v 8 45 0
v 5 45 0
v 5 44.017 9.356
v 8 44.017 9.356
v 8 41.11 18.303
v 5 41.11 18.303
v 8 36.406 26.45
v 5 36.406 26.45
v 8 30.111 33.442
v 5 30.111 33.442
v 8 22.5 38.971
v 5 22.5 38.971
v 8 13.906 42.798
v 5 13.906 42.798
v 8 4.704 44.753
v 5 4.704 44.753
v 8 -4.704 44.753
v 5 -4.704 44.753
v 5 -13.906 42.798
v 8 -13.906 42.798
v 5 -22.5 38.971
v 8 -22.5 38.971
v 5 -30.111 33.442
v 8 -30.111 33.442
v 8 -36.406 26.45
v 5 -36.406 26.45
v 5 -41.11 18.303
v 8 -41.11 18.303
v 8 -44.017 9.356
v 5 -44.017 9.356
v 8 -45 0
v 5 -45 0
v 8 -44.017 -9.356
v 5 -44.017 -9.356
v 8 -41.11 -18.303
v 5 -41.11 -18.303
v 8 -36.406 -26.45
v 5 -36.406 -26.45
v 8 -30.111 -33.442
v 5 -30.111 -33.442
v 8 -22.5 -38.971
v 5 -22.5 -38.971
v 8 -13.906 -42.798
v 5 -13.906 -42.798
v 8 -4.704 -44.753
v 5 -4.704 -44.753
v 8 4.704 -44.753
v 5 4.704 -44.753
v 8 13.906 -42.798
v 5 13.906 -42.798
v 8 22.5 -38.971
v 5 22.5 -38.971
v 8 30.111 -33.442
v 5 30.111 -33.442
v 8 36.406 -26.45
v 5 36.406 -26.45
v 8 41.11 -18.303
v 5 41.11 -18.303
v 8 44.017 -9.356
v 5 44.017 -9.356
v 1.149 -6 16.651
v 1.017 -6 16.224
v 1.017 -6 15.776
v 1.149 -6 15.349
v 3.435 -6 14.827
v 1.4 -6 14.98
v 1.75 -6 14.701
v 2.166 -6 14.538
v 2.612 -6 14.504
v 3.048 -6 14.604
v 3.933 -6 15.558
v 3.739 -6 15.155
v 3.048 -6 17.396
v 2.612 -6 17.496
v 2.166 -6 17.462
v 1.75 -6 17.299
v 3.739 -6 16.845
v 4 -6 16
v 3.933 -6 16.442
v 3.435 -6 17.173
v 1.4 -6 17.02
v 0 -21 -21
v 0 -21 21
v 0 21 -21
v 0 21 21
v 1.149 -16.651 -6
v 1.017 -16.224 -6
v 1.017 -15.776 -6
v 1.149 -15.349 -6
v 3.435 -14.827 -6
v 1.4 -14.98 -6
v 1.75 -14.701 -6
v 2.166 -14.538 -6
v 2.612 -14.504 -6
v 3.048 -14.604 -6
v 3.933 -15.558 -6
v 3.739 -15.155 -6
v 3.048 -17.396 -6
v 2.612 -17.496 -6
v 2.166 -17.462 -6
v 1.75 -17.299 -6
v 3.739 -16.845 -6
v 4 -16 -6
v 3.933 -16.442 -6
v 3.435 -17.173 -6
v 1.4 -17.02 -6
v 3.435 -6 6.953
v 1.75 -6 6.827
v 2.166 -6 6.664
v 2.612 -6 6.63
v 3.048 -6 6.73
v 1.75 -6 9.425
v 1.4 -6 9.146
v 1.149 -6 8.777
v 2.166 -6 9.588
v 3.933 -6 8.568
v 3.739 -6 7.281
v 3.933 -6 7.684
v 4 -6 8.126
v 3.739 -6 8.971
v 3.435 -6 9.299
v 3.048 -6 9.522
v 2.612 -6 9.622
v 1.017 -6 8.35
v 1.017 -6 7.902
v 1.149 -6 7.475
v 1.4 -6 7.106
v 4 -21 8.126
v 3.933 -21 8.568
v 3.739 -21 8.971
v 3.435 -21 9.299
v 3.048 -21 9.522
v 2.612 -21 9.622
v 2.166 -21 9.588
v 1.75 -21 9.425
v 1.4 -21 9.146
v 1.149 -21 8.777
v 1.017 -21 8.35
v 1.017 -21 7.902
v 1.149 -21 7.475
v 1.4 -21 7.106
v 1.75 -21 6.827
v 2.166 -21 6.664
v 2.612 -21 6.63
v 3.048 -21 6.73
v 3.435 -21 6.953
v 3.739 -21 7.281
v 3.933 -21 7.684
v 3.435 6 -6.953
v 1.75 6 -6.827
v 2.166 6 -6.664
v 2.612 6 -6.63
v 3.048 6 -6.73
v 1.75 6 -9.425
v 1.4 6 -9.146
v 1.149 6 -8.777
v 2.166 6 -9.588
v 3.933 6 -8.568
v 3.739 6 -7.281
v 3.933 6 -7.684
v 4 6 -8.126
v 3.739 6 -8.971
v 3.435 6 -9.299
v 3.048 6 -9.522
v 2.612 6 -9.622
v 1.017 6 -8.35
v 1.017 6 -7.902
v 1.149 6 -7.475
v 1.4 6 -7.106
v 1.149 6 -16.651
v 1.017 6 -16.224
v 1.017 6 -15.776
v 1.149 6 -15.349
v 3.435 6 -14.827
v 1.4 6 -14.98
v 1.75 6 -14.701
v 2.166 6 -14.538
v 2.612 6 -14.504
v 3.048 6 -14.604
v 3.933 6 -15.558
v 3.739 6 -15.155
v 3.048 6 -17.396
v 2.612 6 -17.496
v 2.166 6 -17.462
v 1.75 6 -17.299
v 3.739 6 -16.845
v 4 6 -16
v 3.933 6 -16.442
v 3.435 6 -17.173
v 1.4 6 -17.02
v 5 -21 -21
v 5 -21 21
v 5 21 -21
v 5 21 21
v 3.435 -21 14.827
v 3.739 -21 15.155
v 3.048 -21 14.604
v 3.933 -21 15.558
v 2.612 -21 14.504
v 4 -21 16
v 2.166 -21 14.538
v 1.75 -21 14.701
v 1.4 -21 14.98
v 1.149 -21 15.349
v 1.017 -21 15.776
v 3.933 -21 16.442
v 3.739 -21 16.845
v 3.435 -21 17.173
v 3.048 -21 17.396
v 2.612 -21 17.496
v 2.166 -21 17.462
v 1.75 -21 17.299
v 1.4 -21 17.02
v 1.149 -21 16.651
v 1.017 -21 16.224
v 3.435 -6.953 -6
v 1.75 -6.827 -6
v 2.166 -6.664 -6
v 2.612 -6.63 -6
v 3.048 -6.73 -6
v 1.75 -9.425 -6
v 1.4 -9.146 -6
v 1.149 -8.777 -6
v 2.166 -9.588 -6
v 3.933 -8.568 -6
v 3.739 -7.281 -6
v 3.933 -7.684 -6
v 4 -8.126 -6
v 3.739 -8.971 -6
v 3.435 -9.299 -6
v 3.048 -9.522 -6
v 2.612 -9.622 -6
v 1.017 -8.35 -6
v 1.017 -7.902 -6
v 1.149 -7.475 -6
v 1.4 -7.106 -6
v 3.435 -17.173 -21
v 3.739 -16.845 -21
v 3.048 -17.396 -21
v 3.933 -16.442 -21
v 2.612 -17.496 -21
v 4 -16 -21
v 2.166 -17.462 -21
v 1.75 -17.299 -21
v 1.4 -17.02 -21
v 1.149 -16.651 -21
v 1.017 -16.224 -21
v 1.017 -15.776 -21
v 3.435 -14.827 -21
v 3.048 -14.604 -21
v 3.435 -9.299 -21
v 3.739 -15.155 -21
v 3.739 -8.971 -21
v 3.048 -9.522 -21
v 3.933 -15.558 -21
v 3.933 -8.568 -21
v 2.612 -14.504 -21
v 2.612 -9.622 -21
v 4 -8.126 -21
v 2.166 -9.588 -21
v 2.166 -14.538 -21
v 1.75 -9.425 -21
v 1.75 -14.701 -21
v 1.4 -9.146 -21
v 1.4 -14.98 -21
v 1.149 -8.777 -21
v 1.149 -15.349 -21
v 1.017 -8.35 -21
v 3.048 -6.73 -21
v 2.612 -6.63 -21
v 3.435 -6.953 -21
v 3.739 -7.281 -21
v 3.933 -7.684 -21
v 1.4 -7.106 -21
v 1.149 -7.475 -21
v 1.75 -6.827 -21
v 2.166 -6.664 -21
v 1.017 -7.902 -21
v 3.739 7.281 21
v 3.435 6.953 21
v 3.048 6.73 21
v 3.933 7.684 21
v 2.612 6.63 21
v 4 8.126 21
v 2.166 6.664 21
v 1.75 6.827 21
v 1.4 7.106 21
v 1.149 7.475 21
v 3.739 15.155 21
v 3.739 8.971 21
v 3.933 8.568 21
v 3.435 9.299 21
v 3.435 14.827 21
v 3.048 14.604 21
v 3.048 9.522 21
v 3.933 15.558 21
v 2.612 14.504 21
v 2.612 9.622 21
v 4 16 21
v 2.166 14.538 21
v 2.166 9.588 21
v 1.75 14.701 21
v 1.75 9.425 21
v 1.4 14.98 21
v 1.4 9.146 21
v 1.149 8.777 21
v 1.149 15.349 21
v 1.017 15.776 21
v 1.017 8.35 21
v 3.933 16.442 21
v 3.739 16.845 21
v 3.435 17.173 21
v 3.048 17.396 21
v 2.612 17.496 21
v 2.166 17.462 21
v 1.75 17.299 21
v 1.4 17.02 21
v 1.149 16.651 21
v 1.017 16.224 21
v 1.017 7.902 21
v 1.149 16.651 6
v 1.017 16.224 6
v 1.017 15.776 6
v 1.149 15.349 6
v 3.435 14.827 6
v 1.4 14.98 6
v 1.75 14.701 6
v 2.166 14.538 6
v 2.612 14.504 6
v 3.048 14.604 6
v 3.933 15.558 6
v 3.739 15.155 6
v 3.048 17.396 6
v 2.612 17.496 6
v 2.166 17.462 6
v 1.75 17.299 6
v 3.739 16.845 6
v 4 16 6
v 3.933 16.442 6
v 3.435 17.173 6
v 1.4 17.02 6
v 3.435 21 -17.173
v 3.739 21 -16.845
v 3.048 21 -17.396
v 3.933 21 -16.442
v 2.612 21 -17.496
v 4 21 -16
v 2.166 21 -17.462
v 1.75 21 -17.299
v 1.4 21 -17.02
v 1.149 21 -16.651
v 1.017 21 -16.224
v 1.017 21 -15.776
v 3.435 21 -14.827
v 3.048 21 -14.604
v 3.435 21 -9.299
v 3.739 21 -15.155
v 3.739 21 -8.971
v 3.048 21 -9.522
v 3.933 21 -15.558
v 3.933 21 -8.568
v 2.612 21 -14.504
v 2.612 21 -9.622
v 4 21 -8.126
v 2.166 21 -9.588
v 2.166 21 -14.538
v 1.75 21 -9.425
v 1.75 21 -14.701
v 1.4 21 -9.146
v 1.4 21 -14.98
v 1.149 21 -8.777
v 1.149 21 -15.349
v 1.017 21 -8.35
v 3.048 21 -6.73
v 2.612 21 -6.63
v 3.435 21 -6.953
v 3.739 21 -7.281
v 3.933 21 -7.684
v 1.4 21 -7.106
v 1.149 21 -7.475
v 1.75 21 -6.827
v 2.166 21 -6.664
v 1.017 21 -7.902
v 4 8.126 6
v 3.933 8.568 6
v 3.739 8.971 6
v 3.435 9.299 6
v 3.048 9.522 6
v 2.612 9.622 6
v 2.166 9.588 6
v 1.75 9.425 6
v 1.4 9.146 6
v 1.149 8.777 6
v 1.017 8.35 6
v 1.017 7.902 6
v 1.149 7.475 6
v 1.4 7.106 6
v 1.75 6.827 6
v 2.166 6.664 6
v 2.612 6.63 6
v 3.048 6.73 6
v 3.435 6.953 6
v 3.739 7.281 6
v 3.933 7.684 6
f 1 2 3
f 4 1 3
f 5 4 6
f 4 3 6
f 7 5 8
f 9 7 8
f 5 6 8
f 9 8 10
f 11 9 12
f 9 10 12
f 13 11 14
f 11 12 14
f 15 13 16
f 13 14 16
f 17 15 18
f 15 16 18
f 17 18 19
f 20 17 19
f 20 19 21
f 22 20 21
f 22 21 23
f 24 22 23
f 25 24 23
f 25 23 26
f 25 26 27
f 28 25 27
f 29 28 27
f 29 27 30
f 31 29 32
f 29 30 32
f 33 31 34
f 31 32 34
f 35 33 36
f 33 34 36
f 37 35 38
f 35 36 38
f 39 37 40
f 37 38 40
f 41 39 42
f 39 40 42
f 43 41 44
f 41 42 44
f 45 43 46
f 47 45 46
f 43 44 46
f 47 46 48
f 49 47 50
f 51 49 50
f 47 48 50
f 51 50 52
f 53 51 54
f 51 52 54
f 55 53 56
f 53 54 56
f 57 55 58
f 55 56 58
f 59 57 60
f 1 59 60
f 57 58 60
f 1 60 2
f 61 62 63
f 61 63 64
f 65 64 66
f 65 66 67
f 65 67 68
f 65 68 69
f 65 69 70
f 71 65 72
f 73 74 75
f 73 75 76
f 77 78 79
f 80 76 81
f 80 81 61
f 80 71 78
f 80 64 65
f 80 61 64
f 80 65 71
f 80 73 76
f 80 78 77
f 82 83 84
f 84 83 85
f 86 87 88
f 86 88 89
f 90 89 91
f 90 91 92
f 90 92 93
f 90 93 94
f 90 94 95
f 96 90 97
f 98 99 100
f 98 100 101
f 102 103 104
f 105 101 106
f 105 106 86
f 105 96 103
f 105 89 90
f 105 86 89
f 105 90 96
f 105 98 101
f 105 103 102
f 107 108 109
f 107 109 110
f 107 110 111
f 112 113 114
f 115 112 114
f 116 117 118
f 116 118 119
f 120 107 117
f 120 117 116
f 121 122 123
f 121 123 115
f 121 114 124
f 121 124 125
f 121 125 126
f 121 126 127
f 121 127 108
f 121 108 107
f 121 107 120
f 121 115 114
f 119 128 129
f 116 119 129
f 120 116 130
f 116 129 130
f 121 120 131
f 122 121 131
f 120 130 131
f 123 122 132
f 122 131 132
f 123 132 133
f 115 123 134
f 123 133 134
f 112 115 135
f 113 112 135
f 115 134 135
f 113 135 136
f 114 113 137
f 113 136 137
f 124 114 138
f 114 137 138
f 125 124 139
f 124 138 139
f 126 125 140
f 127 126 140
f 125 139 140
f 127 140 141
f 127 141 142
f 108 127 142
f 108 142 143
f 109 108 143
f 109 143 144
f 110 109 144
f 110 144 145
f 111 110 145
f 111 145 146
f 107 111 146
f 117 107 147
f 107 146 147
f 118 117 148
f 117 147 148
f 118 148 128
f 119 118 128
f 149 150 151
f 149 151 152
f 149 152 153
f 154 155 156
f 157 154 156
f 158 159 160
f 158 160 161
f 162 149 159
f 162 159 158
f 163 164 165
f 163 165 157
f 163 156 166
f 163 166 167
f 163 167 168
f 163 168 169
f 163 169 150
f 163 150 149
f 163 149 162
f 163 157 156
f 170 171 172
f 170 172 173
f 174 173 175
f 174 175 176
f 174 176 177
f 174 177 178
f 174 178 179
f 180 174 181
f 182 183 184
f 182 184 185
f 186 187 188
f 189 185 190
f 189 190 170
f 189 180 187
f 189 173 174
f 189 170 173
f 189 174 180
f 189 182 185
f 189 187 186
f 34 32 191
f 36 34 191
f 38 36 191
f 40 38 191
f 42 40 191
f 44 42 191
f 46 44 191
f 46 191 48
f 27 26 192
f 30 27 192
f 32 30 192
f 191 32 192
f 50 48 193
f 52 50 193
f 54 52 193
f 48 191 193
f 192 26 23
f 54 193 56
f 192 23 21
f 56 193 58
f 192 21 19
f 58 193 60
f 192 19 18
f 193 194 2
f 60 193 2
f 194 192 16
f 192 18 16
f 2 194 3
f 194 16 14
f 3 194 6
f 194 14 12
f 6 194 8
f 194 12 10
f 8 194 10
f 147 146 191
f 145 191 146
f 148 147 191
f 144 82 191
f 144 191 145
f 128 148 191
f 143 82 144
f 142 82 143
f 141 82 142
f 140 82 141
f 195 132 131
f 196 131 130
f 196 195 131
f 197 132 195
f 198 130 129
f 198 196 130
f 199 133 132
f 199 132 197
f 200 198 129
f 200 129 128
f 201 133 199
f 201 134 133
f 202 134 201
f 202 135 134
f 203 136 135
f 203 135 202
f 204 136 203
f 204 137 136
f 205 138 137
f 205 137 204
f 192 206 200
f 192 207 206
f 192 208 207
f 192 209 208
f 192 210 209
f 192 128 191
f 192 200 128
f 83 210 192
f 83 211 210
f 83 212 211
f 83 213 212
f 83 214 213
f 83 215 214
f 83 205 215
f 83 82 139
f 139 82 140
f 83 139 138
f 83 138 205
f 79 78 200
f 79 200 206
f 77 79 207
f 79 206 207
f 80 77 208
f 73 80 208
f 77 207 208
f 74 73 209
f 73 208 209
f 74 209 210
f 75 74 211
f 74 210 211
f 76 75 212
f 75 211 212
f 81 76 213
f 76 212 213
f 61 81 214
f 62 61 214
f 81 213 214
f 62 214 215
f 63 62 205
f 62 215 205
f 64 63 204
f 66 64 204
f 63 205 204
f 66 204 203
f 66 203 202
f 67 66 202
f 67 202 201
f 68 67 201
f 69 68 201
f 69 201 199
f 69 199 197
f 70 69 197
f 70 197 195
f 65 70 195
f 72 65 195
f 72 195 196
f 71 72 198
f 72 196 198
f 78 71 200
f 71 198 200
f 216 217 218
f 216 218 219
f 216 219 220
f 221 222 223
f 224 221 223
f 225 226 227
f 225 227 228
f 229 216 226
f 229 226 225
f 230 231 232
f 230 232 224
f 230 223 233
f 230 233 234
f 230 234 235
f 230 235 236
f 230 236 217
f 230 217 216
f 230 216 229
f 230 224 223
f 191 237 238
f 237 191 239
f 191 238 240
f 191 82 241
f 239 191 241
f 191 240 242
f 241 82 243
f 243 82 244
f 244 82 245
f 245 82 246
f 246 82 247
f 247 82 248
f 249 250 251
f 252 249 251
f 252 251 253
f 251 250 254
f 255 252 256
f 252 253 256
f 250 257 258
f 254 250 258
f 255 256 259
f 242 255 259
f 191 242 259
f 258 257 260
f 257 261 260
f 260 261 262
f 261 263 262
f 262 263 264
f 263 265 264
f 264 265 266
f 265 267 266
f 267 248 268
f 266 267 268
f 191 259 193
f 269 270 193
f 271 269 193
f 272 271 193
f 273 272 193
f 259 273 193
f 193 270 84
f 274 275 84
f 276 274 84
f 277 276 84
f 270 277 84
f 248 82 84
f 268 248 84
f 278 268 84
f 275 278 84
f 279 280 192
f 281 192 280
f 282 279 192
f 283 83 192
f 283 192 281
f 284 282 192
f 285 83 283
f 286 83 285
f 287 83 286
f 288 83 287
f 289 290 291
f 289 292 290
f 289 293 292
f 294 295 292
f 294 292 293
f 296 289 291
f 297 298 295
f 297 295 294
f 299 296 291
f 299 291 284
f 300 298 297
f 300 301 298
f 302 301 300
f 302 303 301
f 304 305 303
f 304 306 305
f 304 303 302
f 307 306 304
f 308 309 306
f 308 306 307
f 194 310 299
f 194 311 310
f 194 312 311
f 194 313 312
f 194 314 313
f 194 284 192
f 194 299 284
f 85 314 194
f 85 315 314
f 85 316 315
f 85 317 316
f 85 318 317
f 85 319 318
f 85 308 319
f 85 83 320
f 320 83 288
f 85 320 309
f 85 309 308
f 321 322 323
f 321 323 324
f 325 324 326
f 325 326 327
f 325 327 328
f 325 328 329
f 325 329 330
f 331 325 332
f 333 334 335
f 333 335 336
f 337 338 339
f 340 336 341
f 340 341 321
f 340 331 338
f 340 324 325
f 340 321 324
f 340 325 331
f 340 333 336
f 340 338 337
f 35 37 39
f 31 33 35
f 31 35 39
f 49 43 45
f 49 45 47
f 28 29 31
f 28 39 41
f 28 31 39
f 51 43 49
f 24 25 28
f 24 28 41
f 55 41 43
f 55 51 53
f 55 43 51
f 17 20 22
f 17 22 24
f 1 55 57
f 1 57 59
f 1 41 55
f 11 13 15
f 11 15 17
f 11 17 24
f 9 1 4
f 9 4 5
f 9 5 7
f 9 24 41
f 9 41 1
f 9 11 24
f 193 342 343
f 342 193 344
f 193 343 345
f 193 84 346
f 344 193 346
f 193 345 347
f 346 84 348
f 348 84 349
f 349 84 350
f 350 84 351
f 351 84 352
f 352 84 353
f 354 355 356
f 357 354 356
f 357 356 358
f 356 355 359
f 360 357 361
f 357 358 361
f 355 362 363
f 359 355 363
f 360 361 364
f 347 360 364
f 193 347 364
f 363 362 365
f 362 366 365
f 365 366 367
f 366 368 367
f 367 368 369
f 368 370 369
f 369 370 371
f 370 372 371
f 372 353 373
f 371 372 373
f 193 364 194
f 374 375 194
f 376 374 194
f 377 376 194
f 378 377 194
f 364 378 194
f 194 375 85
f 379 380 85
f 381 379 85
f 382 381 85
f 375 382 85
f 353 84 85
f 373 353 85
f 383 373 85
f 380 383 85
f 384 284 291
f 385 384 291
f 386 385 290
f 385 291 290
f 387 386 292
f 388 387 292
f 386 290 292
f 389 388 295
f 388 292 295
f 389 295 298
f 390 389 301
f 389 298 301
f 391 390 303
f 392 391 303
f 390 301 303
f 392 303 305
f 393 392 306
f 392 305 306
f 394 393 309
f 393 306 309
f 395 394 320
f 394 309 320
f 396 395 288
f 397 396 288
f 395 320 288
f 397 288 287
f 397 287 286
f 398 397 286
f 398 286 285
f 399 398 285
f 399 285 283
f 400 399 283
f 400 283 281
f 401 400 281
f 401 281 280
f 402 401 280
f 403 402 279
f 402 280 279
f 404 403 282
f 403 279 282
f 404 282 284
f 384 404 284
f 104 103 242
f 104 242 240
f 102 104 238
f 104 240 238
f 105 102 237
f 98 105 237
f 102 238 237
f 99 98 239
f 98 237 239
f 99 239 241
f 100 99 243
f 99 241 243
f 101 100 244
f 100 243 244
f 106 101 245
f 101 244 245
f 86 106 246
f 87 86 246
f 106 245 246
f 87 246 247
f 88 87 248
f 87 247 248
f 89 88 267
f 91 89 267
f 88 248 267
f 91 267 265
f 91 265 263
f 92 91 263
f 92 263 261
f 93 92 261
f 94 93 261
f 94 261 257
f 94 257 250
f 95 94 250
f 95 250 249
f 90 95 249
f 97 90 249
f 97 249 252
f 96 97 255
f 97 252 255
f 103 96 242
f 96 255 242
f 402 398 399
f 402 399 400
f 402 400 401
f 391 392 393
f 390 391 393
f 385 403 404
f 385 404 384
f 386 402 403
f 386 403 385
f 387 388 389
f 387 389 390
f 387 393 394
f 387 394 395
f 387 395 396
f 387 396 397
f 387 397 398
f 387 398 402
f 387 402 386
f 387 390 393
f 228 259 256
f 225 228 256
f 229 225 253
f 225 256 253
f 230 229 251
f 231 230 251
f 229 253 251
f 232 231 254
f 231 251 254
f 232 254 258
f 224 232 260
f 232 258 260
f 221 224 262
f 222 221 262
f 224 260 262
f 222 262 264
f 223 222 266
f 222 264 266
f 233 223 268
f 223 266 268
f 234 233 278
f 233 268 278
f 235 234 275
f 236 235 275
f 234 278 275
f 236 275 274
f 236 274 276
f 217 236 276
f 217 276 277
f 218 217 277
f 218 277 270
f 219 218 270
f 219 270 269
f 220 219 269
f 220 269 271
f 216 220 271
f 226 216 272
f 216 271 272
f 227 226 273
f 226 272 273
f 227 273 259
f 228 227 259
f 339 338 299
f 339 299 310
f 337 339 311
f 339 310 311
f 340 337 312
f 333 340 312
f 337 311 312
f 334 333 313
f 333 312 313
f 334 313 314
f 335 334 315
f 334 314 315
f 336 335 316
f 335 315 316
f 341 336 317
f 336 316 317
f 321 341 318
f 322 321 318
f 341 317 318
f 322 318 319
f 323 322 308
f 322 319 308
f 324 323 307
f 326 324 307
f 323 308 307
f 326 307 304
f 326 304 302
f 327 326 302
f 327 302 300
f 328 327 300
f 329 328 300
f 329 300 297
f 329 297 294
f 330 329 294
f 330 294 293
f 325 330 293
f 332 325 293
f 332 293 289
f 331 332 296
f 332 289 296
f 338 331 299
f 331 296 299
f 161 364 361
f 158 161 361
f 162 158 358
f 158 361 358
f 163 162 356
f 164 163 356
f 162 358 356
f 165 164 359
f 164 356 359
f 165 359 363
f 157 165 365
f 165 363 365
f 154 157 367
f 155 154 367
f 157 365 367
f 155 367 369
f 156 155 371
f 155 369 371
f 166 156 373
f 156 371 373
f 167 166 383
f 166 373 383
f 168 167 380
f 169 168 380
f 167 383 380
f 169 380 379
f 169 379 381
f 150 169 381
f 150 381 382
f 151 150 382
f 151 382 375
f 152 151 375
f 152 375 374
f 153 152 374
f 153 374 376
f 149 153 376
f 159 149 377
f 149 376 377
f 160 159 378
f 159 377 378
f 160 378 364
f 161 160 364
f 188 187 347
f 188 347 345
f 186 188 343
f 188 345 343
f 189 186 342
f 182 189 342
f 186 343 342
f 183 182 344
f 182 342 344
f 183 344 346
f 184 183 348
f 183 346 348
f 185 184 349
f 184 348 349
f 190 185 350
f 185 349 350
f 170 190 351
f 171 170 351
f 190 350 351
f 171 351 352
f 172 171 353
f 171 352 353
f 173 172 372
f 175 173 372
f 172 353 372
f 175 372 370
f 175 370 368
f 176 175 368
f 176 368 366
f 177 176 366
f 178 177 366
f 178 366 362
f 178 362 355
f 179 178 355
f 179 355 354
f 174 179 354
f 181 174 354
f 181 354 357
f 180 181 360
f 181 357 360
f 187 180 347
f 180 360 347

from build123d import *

# Parameters (mm, degrees)
F0_W            = 42
F0_H            = 42
F1_DEPTH        = 5
F2_R            = 1.5
F3_DEPTH        = 15
F3_COPIES_COUNT = 4
F5_R            = 45
F6_DEPTH        = 3


# Not quite as in the source:
# - a pattern or mirror of a feature is missing from the dataset's text; its kind, count and spacing are read off the source's solid


with BuildPart() as f1:
    # F0 (on Right) → F1 (new body)
    with BuildSketch(Plane.YZ):
        Rectangle(F0_W, F0_H)
    extrude(amount=F1_DEPTH)

    # F2 (on face) → F3 (cut)
    with BuildSketch(Plane.XZ.offset(21)):
        with Locations((2.5, 16)):
            Circle(F2_R)
        with Locations((2.5, 8.126)):
            Circle(F2_R)
    f3 = extrude(amount=-F3_DEPTH, mode=Mode.SUBTRACT)

    # F3_copies: F3 ×4 about axis
    f3_copies_axis = Axis((0, 0, 0), (1, 0, 0))
    for i in range(1, F3_COPIES_COUNT):
        add(f3.rotate(f3_copies_axis, i * 360 / F3_COPIES_COUNT), mode=Mode.SUBTRACT)

    # F5 (on face) → F6 (join)
    with BuildSketch(Plane.YZ.offset(5)):
        Circle(F5_R)
    extrude(amount=F6_DEPTH)


solid = f1.part
